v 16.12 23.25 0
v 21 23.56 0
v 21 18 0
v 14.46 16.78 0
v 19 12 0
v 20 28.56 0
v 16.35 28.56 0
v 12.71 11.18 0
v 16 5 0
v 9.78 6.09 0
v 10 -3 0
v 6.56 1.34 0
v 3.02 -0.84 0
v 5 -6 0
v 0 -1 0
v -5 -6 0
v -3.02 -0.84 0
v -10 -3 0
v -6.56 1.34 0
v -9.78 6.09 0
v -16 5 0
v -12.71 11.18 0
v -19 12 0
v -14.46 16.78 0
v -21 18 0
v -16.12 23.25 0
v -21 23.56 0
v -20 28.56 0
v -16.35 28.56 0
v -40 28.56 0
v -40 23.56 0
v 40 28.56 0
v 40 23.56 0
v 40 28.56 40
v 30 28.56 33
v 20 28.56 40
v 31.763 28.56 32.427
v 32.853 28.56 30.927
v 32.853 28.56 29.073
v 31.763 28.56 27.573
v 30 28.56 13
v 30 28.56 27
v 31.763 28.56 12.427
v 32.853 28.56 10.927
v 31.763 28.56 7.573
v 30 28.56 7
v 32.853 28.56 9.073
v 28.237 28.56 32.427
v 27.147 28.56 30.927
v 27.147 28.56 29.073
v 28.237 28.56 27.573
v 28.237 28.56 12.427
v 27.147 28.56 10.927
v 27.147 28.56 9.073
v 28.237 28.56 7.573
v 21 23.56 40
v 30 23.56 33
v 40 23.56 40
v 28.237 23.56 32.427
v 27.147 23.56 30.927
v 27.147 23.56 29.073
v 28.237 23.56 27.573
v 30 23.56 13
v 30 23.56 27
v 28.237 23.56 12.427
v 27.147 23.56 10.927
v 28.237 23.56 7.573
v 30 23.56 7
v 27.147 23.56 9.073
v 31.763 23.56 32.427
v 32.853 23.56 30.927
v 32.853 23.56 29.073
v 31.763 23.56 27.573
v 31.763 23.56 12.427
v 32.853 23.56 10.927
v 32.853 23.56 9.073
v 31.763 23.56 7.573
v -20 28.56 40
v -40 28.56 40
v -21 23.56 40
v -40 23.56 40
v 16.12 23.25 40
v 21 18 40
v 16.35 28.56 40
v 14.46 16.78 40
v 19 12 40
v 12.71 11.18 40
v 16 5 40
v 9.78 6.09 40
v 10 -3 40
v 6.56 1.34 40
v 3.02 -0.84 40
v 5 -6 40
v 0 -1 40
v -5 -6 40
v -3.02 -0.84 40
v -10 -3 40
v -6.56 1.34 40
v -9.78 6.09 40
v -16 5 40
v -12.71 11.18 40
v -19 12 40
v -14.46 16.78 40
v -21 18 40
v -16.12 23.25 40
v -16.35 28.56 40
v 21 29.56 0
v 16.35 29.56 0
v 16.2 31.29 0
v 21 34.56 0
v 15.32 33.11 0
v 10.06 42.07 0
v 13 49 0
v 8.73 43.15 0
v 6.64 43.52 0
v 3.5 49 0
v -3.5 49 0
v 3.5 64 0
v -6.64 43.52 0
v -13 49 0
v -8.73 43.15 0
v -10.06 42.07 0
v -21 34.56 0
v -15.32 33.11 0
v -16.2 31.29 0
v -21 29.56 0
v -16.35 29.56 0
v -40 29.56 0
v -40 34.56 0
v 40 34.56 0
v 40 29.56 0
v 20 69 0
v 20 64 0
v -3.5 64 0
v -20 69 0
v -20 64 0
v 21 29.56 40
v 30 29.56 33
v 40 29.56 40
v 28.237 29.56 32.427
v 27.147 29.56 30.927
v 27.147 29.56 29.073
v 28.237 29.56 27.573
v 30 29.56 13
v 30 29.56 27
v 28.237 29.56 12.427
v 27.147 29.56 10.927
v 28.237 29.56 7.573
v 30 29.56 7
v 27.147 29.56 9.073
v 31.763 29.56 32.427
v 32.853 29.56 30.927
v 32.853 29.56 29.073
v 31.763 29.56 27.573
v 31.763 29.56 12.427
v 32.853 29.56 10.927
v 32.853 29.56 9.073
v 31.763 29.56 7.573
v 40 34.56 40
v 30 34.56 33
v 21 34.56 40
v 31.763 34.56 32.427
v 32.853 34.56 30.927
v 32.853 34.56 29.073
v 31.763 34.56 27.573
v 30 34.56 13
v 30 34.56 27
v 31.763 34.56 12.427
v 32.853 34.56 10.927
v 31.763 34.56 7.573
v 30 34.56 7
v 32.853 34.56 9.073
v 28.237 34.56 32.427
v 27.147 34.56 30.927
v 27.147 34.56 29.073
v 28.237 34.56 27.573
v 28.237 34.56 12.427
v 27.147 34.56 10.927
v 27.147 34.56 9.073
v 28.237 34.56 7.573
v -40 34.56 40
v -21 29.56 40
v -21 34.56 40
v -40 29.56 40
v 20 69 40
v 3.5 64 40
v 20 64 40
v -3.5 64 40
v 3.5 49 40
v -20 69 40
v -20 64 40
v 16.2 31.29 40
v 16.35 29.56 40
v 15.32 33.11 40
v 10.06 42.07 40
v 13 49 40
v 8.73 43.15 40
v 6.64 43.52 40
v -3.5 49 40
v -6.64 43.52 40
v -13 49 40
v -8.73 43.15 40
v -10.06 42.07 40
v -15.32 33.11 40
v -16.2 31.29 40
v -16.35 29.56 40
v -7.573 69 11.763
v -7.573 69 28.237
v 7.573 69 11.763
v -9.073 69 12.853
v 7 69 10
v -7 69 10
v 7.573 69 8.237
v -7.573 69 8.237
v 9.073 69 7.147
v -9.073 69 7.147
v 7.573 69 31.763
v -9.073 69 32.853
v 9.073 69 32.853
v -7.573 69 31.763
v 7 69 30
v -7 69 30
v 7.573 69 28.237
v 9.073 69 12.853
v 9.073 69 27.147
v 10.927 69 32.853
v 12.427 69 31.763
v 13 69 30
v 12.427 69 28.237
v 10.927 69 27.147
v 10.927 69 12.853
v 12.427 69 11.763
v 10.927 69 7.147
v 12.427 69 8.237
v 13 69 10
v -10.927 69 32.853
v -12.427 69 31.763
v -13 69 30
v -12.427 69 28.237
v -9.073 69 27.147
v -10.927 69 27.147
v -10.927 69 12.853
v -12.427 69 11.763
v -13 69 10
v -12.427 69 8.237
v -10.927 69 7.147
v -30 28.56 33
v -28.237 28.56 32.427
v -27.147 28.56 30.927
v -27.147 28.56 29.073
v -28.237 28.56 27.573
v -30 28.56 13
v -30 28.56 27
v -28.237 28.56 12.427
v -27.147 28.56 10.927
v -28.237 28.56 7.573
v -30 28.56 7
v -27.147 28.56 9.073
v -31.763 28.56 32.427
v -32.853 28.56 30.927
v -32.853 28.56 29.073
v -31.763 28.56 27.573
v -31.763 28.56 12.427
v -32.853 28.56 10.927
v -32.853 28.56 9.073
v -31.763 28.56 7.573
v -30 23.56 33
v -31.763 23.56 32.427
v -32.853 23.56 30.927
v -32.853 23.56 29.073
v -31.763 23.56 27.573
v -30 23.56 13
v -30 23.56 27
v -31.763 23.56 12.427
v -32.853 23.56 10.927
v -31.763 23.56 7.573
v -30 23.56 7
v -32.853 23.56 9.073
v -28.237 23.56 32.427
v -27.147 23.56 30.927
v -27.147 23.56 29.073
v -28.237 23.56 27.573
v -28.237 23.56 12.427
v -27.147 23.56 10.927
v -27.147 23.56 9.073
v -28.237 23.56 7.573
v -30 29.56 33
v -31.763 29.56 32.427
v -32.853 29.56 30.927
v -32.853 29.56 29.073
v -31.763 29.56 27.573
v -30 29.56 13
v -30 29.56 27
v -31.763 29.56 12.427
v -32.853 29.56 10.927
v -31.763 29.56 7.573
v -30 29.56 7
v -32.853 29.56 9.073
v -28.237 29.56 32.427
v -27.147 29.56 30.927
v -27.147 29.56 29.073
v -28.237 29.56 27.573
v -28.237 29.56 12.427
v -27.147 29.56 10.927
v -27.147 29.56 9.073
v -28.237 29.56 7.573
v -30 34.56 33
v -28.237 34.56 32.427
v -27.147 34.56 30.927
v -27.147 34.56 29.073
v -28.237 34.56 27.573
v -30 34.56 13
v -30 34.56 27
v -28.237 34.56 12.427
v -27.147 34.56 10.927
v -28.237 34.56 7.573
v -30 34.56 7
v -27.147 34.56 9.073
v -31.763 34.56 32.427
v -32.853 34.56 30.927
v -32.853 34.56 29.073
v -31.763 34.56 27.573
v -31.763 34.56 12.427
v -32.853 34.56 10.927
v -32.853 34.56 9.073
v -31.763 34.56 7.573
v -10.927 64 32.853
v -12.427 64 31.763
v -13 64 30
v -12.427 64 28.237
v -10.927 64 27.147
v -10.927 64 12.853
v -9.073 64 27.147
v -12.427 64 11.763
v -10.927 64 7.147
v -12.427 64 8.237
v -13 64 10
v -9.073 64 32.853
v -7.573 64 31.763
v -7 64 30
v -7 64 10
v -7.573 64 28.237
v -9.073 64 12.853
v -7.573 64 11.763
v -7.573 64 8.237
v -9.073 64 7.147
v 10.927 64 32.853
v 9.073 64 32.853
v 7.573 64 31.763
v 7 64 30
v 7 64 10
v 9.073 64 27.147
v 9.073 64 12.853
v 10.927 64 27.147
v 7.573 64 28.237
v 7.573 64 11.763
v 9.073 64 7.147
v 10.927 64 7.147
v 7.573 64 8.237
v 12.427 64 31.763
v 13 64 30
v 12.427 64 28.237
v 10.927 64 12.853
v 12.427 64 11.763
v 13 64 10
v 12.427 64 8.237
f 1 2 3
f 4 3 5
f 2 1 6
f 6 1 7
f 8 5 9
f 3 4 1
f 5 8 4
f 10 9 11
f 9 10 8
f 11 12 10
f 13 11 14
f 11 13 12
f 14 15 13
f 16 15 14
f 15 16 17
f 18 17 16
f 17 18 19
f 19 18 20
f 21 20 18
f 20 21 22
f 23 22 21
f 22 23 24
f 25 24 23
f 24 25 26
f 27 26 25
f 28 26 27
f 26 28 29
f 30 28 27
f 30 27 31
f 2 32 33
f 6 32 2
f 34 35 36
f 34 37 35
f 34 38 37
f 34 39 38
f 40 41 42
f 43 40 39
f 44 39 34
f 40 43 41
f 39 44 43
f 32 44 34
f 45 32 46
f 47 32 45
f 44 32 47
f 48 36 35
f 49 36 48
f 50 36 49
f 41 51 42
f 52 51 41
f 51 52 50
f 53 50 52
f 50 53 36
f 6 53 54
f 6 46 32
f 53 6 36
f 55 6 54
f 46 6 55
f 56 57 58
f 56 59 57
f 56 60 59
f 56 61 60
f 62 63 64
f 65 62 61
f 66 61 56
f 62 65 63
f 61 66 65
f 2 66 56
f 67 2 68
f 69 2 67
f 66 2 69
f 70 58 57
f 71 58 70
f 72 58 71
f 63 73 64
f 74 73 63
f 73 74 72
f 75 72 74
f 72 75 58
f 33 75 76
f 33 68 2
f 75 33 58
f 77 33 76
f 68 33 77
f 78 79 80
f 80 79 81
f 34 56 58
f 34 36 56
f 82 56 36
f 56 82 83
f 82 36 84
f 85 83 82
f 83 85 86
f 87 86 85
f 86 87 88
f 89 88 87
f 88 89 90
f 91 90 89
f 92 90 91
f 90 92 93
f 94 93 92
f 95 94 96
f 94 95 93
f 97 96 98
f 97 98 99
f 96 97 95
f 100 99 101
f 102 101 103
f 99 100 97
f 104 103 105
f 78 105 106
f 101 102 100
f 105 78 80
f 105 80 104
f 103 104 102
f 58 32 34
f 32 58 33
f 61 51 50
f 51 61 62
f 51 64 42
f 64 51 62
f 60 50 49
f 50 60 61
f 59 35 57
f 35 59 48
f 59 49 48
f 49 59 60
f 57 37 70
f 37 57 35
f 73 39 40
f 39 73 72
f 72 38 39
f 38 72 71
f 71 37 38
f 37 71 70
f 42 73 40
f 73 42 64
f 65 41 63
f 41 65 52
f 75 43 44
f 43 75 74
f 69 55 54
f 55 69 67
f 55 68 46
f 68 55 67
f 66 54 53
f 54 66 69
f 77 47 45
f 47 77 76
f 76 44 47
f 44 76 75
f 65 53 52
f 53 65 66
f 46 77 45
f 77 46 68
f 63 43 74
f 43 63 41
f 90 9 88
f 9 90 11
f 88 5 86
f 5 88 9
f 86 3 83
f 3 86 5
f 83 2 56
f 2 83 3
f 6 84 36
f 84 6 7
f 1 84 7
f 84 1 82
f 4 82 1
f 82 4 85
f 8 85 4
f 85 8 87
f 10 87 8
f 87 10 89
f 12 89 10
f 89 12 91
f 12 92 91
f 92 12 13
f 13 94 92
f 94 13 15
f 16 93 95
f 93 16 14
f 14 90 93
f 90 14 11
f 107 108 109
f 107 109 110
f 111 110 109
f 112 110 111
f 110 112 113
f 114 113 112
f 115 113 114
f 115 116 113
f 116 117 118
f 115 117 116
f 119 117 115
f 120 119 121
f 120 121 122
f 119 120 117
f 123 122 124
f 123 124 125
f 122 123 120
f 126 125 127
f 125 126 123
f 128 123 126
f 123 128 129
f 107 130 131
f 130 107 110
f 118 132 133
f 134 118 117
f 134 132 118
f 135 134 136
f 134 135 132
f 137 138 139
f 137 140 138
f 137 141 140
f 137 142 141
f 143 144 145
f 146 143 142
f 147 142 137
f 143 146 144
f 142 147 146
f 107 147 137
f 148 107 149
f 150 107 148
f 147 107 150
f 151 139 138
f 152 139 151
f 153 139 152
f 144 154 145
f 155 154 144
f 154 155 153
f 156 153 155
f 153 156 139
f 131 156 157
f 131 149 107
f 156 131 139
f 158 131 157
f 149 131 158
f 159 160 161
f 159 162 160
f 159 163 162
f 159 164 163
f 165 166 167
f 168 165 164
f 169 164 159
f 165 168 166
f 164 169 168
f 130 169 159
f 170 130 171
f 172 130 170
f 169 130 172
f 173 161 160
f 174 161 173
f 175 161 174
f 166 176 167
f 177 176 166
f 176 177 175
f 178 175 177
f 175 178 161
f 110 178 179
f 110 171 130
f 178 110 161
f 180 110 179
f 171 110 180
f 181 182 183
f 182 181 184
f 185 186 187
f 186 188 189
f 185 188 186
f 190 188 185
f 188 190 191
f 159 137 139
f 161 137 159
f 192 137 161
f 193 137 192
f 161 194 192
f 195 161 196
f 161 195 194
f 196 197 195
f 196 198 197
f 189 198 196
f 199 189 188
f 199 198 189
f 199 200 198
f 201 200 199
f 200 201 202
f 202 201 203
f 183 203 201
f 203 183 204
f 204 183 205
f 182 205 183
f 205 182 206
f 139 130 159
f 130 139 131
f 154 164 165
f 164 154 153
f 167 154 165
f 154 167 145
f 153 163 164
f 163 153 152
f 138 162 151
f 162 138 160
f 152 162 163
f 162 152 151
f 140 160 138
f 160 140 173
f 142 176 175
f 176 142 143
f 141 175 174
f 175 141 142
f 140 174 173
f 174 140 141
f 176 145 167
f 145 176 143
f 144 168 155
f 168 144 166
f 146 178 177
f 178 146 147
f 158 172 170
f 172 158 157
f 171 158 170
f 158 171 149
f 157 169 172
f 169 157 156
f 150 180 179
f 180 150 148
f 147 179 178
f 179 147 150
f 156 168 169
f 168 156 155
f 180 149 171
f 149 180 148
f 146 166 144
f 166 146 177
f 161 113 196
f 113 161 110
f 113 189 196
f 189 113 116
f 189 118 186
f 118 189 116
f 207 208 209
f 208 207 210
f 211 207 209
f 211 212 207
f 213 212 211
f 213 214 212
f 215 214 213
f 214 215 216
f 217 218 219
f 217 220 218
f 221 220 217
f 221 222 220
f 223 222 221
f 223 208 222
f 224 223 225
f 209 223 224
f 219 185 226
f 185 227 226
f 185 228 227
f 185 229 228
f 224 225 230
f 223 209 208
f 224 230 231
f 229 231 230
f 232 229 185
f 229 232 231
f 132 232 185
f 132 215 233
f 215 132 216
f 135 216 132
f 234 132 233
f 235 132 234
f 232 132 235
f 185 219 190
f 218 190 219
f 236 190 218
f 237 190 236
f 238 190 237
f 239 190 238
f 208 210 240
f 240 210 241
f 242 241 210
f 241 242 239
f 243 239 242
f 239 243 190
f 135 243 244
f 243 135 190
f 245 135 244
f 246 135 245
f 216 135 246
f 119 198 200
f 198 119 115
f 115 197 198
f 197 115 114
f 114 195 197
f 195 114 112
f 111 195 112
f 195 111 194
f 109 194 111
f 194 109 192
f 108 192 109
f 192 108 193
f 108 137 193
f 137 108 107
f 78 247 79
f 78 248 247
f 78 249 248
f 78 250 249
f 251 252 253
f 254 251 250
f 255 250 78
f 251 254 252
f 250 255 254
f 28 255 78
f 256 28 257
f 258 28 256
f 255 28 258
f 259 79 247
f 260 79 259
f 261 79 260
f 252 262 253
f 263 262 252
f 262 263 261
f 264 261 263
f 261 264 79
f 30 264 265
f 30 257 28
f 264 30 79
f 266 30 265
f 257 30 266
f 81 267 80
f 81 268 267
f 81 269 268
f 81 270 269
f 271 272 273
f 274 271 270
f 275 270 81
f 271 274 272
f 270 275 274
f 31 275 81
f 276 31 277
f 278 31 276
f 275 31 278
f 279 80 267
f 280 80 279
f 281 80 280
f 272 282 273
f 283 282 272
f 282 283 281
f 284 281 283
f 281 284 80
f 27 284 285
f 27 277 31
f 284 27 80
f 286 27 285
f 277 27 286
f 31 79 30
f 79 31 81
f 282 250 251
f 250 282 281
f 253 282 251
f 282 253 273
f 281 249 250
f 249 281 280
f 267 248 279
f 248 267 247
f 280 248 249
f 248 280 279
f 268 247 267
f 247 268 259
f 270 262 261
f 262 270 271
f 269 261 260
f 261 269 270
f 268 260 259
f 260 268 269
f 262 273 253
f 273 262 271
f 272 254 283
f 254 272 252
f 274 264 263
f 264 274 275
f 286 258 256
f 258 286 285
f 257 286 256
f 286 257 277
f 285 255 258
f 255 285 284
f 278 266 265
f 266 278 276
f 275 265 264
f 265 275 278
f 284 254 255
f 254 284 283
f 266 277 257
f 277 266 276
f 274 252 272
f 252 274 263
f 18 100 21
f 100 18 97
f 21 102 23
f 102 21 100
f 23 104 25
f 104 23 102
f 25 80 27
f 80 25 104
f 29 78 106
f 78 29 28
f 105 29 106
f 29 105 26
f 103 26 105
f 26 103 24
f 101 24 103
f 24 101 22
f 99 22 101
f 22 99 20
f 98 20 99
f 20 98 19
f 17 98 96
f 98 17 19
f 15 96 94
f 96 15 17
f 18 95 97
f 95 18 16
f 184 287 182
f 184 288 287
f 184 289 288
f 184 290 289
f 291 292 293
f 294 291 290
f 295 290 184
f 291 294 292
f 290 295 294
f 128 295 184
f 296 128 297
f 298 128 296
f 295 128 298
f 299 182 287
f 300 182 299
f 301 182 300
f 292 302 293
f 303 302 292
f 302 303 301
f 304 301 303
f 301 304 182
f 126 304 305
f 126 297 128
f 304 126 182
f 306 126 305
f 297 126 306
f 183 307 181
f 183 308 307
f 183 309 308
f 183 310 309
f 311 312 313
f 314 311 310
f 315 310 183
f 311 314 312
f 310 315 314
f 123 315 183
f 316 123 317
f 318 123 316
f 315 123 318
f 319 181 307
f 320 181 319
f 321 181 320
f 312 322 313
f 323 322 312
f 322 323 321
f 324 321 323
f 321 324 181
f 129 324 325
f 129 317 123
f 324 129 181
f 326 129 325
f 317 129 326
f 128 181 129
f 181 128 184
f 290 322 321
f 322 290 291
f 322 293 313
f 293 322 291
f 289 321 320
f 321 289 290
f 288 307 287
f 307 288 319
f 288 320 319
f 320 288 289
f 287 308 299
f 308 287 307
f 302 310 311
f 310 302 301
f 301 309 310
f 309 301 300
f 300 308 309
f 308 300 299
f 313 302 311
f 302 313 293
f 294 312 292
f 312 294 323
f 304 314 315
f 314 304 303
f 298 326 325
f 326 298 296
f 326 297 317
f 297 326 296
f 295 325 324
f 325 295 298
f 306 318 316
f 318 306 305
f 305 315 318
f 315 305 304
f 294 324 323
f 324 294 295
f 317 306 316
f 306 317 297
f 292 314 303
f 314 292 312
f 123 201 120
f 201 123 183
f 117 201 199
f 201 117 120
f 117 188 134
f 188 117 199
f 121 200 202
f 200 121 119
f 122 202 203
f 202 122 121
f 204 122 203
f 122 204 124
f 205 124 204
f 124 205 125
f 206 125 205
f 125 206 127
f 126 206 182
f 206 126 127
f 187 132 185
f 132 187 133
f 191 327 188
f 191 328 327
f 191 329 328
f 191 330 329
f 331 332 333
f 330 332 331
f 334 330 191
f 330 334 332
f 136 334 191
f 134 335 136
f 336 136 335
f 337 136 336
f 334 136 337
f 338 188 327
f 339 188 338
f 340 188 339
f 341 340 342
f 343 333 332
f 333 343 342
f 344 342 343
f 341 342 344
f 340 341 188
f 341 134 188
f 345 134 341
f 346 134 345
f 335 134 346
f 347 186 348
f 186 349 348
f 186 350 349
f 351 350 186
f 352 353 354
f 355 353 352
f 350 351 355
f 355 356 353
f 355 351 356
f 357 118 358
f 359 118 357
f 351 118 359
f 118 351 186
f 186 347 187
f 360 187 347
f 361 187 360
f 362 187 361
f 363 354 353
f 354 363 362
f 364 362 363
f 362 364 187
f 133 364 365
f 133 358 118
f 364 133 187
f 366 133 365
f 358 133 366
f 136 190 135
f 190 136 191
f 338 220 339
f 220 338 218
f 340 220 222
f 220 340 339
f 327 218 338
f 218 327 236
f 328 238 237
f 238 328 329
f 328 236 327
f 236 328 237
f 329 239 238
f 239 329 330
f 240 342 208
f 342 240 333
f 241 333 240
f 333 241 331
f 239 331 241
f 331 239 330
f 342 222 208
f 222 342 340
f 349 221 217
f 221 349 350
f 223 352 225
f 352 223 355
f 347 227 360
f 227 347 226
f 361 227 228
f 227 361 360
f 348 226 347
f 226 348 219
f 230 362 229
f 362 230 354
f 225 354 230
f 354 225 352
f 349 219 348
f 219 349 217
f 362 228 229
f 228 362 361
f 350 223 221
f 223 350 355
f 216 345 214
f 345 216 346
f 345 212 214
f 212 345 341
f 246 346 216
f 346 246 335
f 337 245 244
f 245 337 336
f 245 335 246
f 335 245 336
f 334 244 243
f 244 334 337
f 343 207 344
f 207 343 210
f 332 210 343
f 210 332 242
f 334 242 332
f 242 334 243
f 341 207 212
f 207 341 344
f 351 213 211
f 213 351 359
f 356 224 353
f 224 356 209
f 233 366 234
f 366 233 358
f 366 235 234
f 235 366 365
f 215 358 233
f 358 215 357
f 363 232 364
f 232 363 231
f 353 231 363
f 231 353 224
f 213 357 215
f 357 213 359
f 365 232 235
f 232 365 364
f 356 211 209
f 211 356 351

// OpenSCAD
upper_points = [
    [0, 43.52],
    [6.64, 43.52],
    [8.73, 43.15],
    [10.06, 42.07],
    [15.32, 33.11],
    [16.2, 31.29],
    [16.35, 29.56]];

lower_points = [
    [16.35, 29.56],
    [16.12, 24.25],
    [14.46, 17.78],
    [12.71, 12.18],
    [9.78, 7.09],
    [6.56, 2.34],
    [3.02, 0.16],
    [0,0]];

half_bottom_points = concat(
    lower_points,
    [
        [0, -5],
        [5, -5],
        [10, -2],
        [16, 6],
        [19, 13],
        [21, 19],
        [21, 29.56],
        ]);

half_top_points = concat(
    upper_points,
    [
        [21, 29.56],
        [21, 34.56],
        [13, 49],
        [3.5, 49],
        [3.5, 69],
        [0, 69]]);

module topHole(x, z) {
    translate([x, 76, z]) rotate(a = 90, v = [1, 0, 0]) linear_extrude(height=8) circle(4);
}

module interfaceHole() {
    translate([0, 0, -1]) cylinder(h=9, r=3);
}

module halfInterface() {
    difference () {
        cube(size = [40, 20, 5]);
        translate([10, 10, 0]) interfaceHole();
        translate([30, 10, 0]) interfaceHole();
    }
}

module interface() {
    union () {
        halfInterface();
        mirror([0, 1, 0]) halfInterface();
    }
}

module half_top_half () {
    union () {
        linear_extrude(height=40) polygon(points=half_top_points);
        {
            translate([20, 34.56, 40])
            rotate(a=90, v=[0,1,0])
            rotate(a=90, v=[1,0,0])
            halfInterface();
        }
    }
}

module half_bottom_half () {
    union () {
        linear_extrude(height=40) polygon(points=half_bottom_points);
        translate([40, 24.56, 40]) rotate(a=90, v = [0,0,1]) rotate(a=90, v = [0,1,0]) halfInterface();
    }
}


module half() {
    translate([0, -1, 0]) half_bottom_half();
    half_top_half();
}

half();
mirror([1,0,0]) half();

translate([-20, 69, 20]) rotate(a=90, v=[1,0,0]) interface();
